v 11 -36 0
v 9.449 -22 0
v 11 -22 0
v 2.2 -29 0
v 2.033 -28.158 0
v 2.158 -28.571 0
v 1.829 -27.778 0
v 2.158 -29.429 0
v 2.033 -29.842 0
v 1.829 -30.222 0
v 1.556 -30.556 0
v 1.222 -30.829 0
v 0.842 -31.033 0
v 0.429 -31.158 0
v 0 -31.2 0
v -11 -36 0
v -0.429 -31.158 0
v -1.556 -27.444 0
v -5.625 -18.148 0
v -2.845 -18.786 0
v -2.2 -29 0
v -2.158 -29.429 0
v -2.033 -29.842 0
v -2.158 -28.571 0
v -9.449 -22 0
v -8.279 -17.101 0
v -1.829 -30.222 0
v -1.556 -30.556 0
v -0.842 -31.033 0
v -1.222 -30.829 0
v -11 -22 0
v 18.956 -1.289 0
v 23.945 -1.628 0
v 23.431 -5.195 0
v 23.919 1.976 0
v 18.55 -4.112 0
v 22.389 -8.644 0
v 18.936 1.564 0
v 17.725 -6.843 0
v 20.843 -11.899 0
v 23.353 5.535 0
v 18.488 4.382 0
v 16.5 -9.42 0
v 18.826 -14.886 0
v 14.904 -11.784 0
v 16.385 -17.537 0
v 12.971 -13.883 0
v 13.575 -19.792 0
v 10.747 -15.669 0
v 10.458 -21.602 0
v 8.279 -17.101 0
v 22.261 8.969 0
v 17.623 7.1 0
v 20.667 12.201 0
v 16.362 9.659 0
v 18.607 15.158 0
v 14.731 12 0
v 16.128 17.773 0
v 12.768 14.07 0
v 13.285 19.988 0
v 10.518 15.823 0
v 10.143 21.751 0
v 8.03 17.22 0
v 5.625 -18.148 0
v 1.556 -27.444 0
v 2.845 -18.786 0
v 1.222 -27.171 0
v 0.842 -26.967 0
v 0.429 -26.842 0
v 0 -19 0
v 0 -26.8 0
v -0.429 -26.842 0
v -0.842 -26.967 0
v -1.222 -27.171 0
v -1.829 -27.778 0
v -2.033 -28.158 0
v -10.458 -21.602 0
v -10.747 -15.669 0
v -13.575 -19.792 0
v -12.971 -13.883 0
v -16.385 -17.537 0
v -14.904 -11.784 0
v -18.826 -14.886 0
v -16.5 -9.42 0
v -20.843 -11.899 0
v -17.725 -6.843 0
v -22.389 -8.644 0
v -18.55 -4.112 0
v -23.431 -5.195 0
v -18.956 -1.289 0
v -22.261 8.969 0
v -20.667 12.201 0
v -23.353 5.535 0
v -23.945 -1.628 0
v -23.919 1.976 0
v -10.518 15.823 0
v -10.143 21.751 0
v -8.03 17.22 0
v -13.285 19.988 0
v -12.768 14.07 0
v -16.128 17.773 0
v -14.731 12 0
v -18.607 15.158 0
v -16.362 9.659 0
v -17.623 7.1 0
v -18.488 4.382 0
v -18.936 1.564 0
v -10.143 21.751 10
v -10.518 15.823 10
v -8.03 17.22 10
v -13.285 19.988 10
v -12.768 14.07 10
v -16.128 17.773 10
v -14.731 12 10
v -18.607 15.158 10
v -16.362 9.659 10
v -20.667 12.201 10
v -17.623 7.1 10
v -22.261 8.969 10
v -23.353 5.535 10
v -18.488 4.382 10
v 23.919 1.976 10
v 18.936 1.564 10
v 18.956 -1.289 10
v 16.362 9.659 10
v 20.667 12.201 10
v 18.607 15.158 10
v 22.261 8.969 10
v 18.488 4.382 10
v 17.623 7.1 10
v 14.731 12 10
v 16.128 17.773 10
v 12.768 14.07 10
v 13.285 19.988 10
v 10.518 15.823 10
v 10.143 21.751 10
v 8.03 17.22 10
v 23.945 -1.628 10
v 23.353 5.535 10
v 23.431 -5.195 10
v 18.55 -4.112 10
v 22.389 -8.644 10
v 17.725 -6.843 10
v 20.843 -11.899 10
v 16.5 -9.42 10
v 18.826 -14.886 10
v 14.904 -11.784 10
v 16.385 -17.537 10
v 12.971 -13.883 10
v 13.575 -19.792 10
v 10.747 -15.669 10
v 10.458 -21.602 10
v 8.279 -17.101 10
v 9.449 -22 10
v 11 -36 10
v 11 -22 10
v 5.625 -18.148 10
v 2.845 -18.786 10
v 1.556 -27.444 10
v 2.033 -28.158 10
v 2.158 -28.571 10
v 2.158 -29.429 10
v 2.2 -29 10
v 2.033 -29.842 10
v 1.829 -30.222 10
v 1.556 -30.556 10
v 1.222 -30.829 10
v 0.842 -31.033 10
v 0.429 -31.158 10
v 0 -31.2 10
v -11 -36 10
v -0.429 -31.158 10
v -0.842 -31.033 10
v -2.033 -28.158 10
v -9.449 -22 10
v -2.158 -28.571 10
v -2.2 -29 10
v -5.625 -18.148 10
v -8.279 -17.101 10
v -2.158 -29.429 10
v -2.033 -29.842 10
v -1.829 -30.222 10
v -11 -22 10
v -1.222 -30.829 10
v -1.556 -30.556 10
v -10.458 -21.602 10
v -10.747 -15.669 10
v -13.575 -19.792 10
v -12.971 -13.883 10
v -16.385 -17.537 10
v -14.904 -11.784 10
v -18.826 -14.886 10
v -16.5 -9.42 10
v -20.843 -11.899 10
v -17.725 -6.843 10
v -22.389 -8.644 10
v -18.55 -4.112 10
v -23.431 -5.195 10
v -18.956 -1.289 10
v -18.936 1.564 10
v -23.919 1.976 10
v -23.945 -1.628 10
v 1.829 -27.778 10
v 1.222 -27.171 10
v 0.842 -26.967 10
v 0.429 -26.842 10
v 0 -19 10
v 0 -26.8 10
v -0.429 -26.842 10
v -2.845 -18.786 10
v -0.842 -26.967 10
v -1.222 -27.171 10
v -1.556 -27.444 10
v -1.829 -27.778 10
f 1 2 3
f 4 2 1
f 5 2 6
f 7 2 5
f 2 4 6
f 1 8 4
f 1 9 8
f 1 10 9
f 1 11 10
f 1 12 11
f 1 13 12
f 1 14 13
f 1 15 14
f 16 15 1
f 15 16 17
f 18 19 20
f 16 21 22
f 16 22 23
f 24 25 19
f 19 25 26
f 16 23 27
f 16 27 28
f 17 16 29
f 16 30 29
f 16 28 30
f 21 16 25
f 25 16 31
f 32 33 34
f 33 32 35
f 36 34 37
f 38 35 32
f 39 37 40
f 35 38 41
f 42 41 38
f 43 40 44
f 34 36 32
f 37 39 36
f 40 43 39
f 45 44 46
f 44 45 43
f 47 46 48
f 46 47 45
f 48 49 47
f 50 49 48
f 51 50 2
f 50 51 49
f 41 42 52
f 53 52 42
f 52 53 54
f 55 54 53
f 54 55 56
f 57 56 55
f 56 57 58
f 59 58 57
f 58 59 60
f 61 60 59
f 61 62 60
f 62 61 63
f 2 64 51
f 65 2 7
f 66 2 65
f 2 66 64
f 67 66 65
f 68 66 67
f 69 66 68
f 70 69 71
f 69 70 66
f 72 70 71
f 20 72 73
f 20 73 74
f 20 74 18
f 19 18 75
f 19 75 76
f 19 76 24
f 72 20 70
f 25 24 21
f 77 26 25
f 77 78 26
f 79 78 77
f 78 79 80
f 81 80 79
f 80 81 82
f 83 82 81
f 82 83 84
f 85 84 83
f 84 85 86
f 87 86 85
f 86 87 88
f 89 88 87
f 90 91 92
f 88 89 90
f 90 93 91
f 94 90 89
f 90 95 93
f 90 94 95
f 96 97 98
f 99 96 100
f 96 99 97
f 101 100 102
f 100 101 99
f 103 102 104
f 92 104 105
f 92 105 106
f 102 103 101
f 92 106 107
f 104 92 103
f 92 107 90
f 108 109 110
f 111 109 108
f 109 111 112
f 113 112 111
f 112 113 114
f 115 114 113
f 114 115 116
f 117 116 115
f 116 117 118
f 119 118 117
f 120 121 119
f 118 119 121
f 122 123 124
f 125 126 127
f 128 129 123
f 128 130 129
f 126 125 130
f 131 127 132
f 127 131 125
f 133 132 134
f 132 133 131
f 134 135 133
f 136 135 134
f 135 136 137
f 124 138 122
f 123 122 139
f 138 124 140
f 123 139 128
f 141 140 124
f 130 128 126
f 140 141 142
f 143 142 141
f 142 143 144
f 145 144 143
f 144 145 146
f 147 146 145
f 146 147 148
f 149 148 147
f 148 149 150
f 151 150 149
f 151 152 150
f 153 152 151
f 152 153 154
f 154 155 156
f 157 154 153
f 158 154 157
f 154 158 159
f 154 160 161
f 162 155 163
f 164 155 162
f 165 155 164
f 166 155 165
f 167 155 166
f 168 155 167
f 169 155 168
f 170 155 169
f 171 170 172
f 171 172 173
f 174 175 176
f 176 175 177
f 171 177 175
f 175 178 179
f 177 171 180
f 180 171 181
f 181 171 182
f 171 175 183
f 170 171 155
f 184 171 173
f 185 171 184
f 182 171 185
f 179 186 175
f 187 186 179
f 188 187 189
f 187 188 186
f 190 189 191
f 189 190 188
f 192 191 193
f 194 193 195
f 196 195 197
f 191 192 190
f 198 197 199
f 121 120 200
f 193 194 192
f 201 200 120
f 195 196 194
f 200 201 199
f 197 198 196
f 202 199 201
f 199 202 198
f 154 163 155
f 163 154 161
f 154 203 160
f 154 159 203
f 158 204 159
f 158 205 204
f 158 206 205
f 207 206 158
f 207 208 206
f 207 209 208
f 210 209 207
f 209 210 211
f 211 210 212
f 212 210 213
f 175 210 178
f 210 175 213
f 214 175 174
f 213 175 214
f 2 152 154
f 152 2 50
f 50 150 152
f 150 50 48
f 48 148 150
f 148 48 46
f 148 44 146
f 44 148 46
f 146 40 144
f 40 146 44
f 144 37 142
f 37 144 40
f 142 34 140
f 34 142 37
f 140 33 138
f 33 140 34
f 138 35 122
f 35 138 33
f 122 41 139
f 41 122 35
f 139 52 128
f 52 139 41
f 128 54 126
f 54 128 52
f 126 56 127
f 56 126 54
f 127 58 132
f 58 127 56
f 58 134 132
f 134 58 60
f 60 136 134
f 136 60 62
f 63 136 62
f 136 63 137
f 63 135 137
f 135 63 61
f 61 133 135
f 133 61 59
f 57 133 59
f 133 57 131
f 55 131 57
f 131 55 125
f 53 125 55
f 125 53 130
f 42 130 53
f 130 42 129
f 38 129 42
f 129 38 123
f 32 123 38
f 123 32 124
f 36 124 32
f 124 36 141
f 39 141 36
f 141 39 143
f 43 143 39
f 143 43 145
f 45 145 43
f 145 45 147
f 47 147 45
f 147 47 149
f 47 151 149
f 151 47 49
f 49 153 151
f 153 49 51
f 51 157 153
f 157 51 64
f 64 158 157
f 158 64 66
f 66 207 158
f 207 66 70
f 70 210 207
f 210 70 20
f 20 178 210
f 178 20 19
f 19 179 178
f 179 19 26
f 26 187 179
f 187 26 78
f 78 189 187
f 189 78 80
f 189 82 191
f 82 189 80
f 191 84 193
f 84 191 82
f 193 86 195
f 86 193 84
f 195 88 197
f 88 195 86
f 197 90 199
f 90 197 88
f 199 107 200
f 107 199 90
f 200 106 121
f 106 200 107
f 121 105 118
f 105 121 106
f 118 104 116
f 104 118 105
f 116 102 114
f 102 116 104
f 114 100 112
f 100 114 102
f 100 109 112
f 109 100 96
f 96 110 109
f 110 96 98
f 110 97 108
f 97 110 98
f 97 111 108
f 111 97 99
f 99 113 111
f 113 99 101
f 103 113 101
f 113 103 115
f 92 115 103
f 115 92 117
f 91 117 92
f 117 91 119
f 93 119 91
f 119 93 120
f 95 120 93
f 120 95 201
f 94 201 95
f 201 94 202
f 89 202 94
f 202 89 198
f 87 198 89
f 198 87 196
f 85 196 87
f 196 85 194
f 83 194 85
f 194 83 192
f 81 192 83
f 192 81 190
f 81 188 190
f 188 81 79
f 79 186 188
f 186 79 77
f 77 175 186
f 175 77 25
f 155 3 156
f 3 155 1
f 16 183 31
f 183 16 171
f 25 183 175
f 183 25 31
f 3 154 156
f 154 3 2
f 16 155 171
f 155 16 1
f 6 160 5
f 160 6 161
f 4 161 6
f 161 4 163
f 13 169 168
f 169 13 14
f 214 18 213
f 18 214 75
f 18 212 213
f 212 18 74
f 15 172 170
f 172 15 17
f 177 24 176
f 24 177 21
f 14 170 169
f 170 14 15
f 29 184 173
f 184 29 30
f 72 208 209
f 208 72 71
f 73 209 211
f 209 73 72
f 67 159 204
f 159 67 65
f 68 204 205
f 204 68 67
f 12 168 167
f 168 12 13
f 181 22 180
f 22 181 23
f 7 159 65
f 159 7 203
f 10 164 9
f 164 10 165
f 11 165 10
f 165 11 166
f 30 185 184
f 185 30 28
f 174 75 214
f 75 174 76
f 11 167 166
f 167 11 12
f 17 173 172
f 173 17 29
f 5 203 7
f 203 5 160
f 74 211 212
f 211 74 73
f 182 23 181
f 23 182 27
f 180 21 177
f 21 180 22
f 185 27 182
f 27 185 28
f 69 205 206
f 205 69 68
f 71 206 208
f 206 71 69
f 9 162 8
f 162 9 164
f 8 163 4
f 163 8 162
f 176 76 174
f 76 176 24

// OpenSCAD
$fn = 32;

// ----------------------------------------------------------------------
// Spring clip: 48 mm outside, 5 mm band, 50 degree opening
// ----------------------------------------------------------------------

// --- parameters (mm) ---
outer_r = 24;             // clip outside radius
inner_r = 19;             // clip bore radius
band = 5;                 // band thickness
clip_w = 10;              // clip width
opening = 50;             // opening angle
tab_w = 22;               // tab width
tab_len = 12;             // tab length past the clip
tab_hole = 4.4;           // tab fixing hole

clip_profile = [[-10.143, 21.751], [-13.285, 19.988], [-16.128, 17.773], [-18.607, 15.158], [-20.667, 12.201], [-22.261, 8.969], [-23.353, 5.535], [-23.919, 1.976], [-23.945, -1.628], [-23.431, -5.195], [-22.389, -8.644], [-20.843, -11.899], [-18.826, -14.886], [-16.385, -17.537], [-13.575, -19.792], [-10.458, -21.602], [-7.106, -22.924], [-3.593, -23.729], [0, -24], [3.593, -23.729], [7.106, -22.924], [10.458, -21.602], [13.575, -19.792], [16.385, -17.537], [18.826, -14.886], [20.843, -11.899], [22.389, -8.644], [23.431, -5.195], [23.945, -1.628], [23.919, 1.976], [23.353, 5.535], [22.261, 8.969], [20.667, 12.201], [18.607, 15.158], [16.128, 17.773], [13.285, 19.988], [10.143, 21.751], [8.03, 17.22], [10.518, 15.823], [12.768, 14.07], [14.731, 12], [16.362, 9.659], [17.623, 7.1], [18.488, 4.382], [18.936, 1.564], [18.956, -1.289], [18.55, -4.112], [17.725, -6.843], [16.5, -9.42], [14.904, -11.784], [12.971, -13.883], [10.747, -15.669], [8.279, -17.101], [5.625, -18.148], [2.845, -18.786], [0, -19], [-2.845, -18.786], [-5.625, -18.148], [-8.279, -17.101], [-10.747, -15.669], [-12.971, -13.883], [-14.904, -11.784], [-16.5, -9.42], [-17.725, -6.843], [-18.55, -4.112], [-18.956, -1.289], [-18.936, 1.564], [-18.488, 4.382], [-17.623, 7.1], [-16.362, 9.659], [-14.731, 12], [-12.768, 14.07], [-10.518, 15.823], [-8.03, 17.22]];

difference() {
  union() {
    linear_extrude(height = clip_w) polygon(clip_profile);
    /* mounting tab, sunk 2 mm into the band */
    translate([-11, -36, 0]) cube([tab_w, 14, clip_w]);
  }
  translate([0, -29, -2.5]) cylinder(h = clip_w + 5, d = tab_hole);
}
